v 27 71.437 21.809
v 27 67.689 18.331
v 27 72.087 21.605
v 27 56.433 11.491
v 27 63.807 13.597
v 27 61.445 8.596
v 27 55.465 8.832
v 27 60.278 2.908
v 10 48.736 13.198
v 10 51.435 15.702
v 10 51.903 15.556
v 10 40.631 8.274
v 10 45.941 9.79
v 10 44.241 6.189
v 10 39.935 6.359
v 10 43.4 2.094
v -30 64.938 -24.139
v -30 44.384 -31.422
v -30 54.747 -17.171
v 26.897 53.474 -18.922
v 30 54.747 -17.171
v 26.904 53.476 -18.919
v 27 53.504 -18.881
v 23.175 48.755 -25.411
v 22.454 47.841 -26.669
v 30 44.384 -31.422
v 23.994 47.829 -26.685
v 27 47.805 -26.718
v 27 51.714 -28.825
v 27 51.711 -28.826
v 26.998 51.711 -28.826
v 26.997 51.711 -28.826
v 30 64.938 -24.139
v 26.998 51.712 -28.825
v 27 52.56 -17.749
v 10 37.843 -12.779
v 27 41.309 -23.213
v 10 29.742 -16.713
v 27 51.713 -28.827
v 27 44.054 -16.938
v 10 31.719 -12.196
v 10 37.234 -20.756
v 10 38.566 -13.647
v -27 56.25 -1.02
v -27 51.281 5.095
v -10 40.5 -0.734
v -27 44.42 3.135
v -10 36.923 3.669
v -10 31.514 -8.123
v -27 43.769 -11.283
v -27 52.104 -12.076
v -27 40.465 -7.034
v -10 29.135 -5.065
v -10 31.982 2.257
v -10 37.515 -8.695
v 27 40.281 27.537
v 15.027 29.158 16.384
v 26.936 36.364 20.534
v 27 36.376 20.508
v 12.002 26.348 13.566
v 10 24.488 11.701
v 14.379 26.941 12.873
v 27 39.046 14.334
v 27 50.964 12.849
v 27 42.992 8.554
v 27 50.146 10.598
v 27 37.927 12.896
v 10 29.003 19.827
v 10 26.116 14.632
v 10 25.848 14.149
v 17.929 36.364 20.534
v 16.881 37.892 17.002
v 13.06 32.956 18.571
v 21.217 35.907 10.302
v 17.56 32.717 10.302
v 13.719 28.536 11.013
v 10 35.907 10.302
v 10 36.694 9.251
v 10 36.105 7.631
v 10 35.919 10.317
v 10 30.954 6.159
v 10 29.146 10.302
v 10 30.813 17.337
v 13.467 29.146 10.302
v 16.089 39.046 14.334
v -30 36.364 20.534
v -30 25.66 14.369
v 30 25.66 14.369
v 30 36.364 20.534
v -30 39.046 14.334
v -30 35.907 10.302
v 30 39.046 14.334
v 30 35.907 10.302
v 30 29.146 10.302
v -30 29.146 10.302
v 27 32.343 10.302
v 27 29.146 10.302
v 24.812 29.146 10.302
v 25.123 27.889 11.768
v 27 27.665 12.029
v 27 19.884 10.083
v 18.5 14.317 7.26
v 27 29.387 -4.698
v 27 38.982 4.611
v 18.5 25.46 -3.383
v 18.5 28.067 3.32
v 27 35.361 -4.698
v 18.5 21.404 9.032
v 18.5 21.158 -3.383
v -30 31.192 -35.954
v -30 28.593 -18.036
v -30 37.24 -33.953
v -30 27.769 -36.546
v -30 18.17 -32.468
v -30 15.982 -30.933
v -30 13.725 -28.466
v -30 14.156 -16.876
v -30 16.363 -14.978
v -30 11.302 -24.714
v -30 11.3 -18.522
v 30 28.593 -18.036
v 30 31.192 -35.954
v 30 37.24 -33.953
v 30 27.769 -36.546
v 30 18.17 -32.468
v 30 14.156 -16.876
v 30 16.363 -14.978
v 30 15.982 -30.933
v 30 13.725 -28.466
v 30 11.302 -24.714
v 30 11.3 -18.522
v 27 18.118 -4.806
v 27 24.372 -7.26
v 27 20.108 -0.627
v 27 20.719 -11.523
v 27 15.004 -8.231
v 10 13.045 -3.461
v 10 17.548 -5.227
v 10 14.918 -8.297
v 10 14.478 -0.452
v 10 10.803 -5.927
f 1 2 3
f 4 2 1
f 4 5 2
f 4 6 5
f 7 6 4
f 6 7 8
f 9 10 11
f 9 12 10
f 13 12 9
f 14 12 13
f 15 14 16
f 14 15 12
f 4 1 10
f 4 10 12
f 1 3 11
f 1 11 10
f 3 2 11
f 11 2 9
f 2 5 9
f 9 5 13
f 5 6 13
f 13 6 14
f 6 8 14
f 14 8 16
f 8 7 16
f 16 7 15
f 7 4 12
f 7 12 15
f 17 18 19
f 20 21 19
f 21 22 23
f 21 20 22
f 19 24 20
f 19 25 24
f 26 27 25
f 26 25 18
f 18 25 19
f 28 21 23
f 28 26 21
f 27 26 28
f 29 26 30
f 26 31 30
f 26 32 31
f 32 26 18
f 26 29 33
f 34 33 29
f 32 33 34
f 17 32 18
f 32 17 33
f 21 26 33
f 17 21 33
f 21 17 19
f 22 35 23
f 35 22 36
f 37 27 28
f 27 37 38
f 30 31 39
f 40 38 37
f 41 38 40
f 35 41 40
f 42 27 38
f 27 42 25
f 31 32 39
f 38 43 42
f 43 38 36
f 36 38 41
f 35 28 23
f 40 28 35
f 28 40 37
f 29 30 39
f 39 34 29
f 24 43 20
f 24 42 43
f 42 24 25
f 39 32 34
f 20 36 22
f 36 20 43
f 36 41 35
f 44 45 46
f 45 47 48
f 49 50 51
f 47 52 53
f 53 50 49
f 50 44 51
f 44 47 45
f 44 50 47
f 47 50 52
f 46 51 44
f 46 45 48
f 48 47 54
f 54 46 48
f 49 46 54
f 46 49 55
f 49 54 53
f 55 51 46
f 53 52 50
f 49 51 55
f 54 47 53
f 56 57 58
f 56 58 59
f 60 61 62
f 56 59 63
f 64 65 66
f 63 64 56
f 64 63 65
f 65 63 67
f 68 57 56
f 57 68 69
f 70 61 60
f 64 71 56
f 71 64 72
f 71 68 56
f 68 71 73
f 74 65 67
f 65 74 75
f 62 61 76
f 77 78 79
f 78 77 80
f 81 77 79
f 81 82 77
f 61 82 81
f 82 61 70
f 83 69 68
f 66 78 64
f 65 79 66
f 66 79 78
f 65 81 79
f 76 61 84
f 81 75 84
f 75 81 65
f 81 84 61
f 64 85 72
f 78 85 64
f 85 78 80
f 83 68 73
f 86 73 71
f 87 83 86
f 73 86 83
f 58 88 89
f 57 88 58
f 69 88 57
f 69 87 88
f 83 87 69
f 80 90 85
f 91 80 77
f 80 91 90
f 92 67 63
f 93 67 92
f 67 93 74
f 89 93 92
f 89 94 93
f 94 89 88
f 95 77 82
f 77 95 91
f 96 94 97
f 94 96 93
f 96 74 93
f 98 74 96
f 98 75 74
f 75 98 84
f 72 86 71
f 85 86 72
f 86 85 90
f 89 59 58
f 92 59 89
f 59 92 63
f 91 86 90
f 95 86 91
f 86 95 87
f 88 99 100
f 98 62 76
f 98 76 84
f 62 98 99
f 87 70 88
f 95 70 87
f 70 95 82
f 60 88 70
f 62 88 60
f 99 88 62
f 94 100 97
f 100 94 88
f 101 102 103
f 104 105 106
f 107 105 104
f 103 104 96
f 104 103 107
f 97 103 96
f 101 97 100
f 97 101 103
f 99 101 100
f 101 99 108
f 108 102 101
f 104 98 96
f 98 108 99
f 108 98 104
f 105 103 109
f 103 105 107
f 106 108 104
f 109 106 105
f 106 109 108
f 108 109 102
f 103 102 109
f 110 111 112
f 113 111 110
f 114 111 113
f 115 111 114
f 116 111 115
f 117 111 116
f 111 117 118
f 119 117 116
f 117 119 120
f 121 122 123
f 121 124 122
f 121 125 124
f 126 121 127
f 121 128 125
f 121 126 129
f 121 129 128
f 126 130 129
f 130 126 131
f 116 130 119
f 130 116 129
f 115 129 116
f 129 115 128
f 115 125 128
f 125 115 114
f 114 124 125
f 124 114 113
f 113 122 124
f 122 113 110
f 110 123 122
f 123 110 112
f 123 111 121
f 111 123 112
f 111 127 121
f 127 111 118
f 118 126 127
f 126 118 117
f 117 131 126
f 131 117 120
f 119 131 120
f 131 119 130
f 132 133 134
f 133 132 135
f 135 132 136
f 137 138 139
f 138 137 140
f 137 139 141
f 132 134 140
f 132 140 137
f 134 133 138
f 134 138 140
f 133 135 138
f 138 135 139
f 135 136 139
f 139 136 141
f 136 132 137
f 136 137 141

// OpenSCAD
$fn=28;
MASTER="Camera_Right_Grip_MASTER_98mm.stl";
cell_0 = [[2.9084,60.2779],[8.5959,61.4452],[13.5970,63.8075],[18.3312,67.6891],[21.6054,72.0873],[21.8090,71.4373],[11.4911,56.4326],[8.8316,55.4652]];
cell_1 = [[17.1711,54.7469],[24.1386,64.9382],[31.4220,44.3844]];
cell_2 = [[-28.8272,51.7132],[-18.9537,53.5645],[-17.7486,52.5603],[-16.9384,44.0537],[-23.2126,41.3088]];
cell_3 = [[-12.0765,52.1041],[-1.0201,56.2504],[5.0953,51.2815],[3.1346,44.4196],[-7.0344,40.4647],[-11.2826,43.7693]];
cell_4 = [[8.5543,42.9917],[10.5981,50.1456],[12.8488,50.9639],[27.5374,40.2813],[16.2516,34.0114]];
cell_5 = [[-20.5343,36.3645],[-14.3342,39.0460],[-10.3017,35.9075],[-10.3016,29.1457],[-14.3687,25.6596]];
cell_6 = [[-4.6983,35.3612],[4.6114,38.9819],[12.5440,29.7271],[10.0832,19.8843],[-4.6983,29.3867]];
cell_7 = [[14.9784,16.3626],[18.0362,28.5928],[33.9532,37.2402],[35.9542,31.1924],[36.5456,27.7691],[32.4676,18.1699],[30.9334,15.9823],[28.4659,13.7248],[24.7140,11.3016],[18.5217,11.3000],[16.8759,14.1563]];
cell_8 = [[-11.5230,20.7189],[-7.2604,24.3725],[-0.6272,20.1085],[-4.8064,18.1178],[-8.2314,15.0036]];
module yz_prism(poly, x0, depth, scale2=1.0) {
    // local extrusion Z -> global X; local X->Y, local Y->Z
    translate([x0,0,0]) rotate([0,90,0])
        linear_extrude(height=depth, center=false, convexity=10, scale=scale2)
            polygon(points=poly);
}
module through_cut(poly) {
    translate([-30,0,0]) rotate([0,90,0])
        linear_extrude(height=60, convexity=10)
            polygon(points=poly);
}
module pocket_plus(poly, depth) {
    // starts beyond +X outer face and tapers inward
    translate([27.0,0,0]) rotate([0,-90,0]) linear_extrude(height=depth, convexity=10, scale=0.72) polygon(points=poly);
}
module pocket_minus(poly, depth) {
    // mirrored construction from -X side
    mirror([1,0,0]) translate([27.0,0,0]) rotate([0,-90,0]) linear_extrude(height=depth, convexity=10, scale=0.72) polygon(points=poly);
}

module raw_cutters(){ union(){
  pocket_plus(cell_0, 17.0);
  through_cut(cell_1);
  pocket_plus(cell_2, 17.0);
  pocket_minus(cell_3, 17.0);
  pocket_plus(cell_4, 17.0);
  through_cut(cell_5);
  pocket_plus(cell_6, 8.5);
  through_cut(cell_7);
  pocket_plus(cell_8, 17.0);
} }

// Remove the protected electronics keepout from every cutter.
module keepout(){
  ellipsoid([-5.5000,10.0000,2.0000], [9.6000,13.2000,7.2000]);
  ellipsoid([-5.0000,10.5000,18.0000], [9.6000,13.2000,7.2000]);
  ellipsoid([-3.5000,7.0000,36.0000], [9.6000,13.2000,7.2000]);
  ellipsoid([-1.0000,1.5000,52.0000], [9.6000,13.2000,7.2000]);
  ellipsoid([1.5000,-7.0000,68.0000], [9.6000,13.2000,7.2000]);
  ellipsoid([1.0000,-9.0000,75.0000], [9.6000,13.2000,7.2000]);
  hull() { ellipsoid([-5.5000,10.0000,2.0000], [9.6000,13.2000,7.2000]); ellipsoid([-5.0000,10.5000,18.0000], [9.6000,13.2000,7.2000]); }
  hull() { ellipsoid([-5.0000,10.5000,18.0000], [9.6000,13.2000,7.2000]); ellipsoid([-3.5000,7.0000,36.0000], [9.6000,13.2000,7.2000]); }
  hull() { ellipsoid([-3.5000,7.0000,36.0000], [9.6000,13.2000,7.2000]); ellipsoid([-1.0000,1.5000,52.0000], [9.6000,13.2000,7.2000]); }
  hull() { ellipsoid([-1.0000,1.5000,52.0000], [9.6000,13.2000,7.2000]); ellipsoid([1.5000,-7.0000,68.0000], [9.6000,13.2000,7.2000]); }
  hull() { ellipsoid([1.5000,-7.0000,68.0000], [9.6000,13.2000,7.2000]); ellipsoid([1.0000,-9.0000,75.0000], [9.6000,13.2000,7.2000]); }
}
module ellipsoid(c,r){translate(c) scale(r) sphere(1);}
difference(){ raw_cutters(); keepout(); }
